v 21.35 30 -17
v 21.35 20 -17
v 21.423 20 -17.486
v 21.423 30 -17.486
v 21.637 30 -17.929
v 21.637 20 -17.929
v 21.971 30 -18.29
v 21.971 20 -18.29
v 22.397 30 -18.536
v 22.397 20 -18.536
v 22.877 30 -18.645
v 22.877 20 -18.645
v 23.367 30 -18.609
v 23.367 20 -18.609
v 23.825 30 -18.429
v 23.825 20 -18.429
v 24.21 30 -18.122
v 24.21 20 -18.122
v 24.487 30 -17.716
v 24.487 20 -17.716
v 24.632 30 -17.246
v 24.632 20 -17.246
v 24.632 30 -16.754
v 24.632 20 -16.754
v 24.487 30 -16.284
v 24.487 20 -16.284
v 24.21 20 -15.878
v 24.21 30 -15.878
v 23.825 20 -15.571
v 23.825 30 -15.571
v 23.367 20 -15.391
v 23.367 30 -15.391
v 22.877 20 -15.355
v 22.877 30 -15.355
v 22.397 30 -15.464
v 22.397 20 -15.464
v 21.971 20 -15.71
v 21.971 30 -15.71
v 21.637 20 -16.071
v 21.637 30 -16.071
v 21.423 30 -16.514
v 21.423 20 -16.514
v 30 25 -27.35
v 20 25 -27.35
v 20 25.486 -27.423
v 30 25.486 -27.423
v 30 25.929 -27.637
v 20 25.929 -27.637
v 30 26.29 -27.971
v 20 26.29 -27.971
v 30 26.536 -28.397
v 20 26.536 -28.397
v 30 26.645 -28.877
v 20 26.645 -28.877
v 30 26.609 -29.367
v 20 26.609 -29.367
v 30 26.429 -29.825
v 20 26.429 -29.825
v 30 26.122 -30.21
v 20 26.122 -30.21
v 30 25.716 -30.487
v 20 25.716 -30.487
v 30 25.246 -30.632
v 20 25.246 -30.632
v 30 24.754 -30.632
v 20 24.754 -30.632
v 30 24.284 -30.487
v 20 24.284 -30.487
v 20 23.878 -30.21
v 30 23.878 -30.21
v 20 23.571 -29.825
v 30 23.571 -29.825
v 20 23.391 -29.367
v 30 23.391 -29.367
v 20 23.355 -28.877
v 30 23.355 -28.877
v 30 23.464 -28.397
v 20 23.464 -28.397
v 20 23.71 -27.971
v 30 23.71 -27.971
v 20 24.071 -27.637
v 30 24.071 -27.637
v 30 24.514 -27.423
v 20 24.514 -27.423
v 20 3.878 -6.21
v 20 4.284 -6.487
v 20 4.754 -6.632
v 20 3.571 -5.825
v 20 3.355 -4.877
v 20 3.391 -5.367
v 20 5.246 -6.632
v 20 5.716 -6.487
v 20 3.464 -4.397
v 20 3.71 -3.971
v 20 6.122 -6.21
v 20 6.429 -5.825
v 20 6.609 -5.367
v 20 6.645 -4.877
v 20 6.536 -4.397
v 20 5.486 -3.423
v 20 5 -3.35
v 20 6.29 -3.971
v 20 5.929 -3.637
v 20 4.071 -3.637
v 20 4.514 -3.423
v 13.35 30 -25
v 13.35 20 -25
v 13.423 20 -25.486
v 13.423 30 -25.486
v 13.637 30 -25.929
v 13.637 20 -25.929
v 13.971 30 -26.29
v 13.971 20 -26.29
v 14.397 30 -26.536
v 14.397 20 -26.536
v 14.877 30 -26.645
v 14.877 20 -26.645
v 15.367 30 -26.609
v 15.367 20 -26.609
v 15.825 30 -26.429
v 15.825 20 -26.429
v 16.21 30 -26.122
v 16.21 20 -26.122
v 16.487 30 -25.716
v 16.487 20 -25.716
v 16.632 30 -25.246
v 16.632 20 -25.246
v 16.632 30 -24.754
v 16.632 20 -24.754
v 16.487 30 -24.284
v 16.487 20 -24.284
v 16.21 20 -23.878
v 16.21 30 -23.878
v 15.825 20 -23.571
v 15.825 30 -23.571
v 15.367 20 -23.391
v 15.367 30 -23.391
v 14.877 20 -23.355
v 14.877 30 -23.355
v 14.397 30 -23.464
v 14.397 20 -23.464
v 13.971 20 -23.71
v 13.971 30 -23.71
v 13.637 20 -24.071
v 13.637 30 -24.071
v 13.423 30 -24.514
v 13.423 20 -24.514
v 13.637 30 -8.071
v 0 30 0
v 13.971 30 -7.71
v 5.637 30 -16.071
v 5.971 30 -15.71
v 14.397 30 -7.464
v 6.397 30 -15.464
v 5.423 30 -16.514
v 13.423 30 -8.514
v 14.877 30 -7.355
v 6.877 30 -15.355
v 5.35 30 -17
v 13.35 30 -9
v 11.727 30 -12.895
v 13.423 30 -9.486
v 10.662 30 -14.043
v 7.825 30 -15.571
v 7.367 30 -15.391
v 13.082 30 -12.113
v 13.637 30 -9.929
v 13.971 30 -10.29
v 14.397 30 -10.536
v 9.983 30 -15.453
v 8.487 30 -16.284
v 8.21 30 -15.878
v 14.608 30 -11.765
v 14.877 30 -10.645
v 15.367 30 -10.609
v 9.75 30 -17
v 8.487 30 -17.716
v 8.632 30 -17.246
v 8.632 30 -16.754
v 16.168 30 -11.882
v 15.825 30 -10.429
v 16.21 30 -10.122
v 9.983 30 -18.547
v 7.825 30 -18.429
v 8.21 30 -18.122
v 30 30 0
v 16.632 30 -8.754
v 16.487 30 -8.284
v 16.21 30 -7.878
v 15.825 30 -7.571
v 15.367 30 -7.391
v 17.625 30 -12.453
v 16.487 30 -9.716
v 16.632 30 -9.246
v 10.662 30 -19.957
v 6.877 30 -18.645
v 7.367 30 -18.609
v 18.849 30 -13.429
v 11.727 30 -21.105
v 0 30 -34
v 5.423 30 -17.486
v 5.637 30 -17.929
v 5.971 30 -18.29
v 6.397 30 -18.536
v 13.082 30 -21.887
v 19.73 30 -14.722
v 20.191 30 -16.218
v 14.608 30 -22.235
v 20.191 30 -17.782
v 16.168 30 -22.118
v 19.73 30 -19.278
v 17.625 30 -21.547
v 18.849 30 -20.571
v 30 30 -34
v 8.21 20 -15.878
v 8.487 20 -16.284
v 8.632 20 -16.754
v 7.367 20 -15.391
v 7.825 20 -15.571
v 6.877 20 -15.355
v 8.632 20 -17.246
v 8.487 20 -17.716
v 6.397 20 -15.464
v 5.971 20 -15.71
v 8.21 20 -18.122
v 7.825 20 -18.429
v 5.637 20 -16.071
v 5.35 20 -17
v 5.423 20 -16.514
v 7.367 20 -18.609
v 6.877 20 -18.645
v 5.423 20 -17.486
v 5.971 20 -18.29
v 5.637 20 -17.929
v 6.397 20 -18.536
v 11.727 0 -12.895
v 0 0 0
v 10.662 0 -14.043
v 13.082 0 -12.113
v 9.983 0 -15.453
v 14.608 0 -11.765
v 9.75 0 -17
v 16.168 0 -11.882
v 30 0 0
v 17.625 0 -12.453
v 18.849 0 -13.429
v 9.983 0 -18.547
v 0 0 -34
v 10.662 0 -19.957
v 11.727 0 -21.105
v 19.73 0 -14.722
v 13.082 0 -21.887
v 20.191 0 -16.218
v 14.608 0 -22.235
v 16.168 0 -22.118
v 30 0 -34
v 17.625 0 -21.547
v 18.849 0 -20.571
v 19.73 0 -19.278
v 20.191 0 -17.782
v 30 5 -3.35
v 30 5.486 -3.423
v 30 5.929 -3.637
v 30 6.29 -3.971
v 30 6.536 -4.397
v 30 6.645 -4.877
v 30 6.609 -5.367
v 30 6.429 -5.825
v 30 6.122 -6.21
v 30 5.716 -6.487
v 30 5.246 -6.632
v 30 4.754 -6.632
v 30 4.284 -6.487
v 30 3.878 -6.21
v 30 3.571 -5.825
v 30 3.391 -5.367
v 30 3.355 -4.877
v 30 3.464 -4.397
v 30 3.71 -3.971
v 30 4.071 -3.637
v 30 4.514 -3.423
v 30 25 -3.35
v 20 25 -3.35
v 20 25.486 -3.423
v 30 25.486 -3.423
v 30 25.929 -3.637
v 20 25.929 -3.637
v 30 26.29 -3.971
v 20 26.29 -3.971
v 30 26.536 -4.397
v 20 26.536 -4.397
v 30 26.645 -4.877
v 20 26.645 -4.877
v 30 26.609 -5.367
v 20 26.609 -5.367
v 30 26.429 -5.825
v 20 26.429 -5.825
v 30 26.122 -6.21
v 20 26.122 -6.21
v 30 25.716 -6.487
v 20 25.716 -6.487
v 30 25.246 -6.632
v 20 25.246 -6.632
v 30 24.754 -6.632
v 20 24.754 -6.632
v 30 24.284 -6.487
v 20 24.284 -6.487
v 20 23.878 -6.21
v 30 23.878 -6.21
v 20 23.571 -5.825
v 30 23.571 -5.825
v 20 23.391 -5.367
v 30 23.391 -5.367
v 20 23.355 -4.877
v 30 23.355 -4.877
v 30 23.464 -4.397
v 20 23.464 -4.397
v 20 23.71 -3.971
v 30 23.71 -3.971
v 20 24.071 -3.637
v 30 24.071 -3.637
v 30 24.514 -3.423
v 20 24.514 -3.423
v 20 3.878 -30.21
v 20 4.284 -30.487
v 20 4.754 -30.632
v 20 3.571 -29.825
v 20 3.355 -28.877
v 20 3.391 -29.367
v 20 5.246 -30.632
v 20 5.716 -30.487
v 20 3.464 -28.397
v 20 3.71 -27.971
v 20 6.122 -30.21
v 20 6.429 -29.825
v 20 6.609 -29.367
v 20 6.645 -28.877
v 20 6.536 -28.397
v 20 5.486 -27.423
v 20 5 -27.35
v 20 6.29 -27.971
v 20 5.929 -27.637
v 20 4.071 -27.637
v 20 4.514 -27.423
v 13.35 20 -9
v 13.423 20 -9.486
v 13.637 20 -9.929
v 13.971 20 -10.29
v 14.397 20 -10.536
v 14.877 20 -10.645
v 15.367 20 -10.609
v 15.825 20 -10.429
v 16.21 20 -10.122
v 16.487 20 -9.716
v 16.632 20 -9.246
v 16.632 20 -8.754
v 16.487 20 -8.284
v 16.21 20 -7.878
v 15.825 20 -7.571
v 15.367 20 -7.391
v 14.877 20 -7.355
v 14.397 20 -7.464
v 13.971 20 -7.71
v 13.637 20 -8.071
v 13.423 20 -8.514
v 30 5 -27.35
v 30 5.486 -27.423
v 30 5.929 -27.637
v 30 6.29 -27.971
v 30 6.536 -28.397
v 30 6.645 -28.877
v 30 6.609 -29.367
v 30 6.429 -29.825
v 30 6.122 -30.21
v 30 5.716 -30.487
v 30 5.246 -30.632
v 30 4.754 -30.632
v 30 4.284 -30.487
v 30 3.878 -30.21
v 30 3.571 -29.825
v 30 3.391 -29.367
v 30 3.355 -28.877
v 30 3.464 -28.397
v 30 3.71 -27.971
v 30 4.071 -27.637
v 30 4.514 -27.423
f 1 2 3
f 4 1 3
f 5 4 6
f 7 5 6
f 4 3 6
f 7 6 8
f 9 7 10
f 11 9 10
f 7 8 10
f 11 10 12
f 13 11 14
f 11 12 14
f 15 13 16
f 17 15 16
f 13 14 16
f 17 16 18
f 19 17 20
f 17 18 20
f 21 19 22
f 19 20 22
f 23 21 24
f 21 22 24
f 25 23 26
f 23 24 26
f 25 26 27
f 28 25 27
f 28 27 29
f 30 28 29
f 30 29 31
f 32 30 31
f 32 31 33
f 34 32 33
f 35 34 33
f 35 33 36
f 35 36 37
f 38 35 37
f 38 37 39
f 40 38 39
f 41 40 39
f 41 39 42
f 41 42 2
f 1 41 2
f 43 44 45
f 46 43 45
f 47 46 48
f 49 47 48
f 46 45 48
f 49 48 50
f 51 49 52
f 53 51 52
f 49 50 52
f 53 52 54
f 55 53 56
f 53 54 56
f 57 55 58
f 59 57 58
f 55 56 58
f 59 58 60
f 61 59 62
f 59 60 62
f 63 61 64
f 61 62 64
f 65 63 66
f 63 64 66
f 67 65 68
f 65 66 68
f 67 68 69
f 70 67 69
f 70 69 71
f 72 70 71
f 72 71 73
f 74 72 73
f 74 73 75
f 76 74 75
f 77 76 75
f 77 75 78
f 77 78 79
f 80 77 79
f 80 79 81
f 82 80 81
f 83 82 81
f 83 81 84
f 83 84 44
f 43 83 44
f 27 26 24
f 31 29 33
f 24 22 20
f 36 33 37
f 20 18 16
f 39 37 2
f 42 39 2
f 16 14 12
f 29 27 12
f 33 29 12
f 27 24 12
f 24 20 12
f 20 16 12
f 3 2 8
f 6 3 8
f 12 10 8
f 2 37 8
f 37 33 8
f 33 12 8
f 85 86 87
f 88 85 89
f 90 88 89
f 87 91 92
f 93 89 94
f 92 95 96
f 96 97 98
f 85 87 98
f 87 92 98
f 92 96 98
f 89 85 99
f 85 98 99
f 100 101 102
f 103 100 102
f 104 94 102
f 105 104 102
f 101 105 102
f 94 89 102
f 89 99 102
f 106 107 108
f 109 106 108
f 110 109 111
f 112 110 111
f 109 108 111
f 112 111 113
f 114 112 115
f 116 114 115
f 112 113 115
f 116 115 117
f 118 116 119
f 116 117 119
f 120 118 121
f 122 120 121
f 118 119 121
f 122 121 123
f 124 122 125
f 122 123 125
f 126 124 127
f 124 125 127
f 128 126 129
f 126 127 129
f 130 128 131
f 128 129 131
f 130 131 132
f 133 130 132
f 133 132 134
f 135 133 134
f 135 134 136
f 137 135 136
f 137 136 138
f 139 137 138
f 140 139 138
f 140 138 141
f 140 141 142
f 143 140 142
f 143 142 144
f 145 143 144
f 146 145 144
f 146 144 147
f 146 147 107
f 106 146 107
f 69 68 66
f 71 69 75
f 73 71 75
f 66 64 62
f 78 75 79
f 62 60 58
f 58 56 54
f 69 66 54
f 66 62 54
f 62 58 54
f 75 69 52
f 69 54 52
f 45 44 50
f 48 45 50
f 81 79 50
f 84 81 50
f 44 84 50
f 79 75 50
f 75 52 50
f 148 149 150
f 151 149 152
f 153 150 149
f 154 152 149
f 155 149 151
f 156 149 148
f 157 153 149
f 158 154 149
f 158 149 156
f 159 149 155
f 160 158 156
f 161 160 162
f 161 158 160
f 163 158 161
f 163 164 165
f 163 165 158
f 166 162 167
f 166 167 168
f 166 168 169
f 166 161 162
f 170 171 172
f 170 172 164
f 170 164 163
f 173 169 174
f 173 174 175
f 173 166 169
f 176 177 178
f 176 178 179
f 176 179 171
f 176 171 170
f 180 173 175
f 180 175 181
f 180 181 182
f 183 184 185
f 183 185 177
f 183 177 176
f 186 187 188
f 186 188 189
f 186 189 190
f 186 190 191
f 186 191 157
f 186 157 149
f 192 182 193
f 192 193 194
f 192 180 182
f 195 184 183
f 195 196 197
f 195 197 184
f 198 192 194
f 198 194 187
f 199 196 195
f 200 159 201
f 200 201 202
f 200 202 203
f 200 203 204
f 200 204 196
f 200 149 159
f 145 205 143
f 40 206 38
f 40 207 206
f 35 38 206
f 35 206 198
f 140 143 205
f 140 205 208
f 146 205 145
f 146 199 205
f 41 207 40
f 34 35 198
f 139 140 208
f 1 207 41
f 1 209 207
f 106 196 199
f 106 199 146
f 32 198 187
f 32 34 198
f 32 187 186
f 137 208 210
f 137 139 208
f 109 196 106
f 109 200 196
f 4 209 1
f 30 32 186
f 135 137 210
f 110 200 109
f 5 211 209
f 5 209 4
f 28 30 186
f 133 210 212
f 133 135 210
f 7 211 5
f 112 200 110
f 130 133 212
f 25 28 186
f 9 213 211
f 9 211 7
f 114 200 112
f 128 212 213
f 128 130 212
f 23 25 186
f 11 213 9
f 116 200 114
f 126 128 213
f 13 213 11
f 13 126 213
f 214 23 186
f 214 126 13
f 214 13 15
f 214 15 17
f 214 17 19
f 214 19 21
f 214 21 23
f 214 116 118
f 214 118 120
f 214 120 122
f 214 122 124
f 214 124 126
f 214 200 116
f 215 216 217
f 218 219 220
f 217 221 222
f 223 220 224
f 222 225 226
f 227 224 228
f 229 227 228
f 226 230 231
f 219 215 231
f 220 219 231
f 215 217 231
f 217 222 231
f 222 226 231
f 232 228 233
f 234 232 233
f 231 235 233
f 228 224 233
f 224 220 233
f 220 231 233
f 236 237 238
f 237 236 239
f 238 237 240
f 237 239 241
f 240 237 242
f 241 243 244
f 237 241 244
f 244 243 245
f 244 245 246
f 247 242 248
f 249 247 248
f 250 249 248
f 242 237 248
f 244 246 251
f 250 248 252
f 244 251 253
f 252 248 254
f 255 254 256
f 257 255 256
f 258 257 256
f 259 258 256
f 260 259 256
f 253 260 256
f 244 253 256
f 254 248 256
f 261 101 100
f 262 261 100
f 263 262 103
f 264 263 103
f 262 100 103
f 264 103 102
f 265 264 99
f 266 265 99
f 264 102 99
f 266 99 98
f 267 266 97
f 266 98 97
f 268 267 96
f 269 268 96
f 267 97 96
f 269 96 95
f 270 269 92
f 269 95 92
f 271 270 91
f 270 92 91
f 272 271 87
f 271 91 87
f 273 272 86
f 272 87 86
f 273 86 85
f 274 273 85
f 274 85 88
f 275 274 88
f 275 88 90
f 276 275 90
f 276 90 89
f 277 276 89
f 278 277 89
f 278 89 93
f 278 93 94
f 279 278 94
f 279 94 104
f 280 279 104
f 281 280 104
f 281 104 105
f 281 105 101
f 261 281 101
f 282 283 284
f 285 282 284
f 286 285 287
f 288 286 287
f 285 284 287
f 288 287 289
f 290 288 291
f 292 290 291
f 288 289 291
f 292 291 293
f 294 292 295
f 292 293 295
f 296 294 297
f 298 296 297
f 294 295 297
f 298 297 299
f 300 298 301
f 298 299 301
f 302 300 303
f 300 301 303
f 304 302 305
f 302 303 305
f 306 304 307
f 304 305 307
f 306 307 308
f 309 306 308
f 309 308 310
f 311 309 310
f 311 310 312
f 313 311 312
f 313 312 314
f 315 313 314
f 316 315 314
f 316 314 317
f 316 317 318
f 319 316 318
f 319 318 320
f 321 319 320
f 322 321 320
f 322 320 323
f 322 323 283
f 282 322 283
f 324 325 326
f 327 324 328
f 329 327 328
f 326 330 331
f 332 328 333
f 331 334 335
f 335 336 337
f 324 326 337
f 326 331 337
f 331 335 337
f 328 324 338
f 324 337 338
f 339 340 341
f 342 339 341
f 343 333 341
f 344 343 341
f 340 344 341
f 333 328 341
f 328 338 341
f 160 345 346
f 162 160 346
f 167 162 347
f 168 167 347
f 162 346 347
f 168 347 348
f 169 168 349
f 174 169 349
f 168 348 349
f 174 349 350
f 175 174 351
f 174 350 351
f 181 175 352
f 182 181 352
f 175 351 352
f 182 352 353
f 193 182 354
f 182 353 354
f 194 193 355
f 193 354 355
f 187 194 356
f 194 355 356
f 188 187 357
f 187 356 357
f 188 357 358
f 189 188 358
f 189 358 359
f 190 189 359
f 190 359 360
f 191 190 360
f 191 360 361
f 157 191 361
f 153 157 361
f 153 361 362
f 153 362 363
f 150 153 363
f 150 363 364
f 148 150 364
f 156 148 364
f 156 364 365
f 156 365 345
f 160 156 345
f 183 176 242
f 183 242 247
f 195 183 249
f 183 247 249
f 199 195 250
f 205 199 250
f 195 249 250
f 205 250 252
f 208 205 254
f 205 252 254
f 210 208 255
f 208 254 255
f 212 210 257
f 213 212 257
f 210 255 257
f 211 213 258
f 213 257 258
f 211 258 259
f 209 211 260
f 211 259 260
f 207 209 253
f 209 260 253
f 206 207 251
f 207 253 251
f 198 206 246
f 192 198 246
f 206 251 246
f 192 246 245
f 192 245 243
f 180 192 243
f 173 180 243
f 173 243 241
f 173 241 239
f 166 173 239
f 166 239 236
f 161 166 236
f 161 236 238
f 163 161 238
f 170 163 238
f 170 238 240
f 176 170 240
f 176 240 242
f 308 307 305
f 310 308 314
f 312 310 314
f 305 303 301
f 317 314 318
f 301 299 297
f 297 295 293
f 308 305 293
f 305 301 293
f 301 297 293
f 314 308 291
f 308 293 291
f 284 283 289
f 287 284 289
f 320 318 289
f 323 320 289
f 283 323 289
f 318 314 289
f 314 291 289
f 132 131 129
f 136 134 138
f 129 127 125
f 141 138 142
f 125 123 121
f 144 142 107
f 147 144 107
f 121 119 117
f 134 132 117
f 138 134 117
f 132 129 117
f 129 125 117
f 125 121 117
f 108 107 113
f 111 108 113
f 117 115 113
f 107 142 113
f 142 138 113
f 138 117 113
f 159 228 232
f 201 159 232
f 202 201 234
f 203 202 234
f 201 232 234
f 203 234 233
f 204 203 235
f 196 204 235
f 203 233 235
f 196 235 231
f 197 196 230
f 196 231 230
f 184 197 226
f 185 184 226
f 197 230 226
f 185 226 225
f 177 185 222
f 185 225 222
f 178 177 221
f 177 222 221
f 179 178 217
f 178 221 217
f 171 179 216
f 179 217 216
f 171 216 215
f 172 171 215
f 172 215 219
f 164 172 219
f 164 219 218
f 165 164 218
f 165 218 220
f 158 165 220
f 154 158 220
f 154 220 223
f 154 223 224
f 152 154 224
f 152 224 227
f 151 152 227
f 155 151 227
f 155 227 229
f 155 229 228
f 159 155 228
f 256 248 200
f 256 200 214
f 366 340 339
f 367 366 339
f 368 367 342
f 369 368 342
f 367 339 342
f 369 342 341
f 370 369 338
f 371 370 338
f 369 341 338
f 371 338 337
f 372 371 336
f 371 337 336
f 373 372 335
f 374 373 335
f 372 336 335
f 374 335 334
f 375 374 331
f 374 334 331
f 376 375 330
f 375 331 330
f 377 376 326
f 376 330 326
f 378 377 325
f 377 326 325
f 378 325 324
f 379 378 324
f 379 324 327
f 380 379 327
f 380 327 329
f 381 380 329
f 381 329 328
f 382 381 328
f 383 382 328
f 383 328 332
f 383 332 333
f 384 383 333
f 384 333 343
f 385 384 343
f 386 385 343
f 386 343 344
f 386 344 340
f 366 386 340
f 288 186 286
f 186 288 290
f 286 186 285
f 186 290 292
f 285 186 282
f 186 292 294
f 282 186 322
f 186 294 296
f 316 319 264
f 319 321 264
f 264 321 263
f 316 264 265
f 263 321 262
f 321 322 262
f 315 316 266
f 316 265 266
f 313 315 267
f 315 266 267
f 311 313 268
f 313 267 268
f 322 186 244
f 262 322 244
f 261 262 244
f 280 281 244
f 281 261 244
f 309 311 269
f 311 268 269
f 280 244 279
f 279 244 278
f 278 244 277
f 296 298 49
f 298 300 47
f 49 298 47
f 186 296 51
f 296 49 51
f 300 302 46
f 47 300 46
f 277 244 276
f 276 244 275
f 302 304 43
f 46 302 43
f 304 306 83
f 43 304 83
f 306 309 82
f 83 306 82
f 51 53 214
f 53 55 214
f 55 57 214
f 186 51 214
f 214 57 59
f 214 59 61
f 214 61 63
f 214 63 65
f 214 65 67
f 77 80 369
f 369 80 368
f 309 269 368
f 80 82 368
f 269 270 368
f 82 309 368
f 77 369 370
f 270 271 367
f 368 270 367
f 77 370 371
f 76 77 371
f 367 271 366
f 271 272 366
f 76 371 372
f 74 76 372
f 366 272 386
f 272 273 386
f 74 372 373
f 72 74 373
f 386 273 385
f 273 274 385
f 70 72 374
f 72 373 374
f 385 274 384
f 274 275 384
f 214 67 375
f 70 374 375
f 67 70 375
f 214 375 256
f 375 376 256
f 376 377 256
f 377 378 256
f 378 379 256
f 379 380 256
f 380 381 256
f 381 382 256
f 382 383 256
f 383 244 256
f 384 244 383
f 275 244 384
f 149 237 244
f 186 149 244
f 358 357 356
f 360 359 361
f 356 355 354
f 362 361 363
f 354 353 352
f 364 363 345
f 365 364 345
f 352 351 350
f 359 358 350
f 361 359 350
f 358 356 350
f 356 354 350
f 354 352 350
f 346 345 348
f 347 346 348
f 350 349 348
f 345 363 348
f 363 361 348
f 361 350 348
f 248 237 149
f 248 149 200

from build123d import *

# Parameters (mm, degrees)
SKETCH_1_W          = 30
SKETCH_1_H          = 34
EXTRUDE_1_DEPTH     = 30
HOLE_WIZARD_1_D     = 3.3
HOLE_WIZARD_1_DEPTH = 10
HOLE_WIZARD_2_D     = 3.3
HOLE_WIZARD_2_DEPTH = 10
HOLE_WIZARD_3_D     = 10.5


with BuildPart() as part:
    # 草图1 → 凸台-拉伸1 (new body)
    with BuildSketch(Plane(origin=(0, 0, 0), x_dir=(1, 0, 0), z_dir=(0, 1, 0))):
        with Locations((15, 17)):
            Rectangle(SKETCH_1_W, SKETCH_1_H)
    extrude(amount=EXTRUDE_1_DEPTH)

    # 孔1
    with Locations(Plane(origin=(30, 0, 0), x_dir=(0, 0, -1), z_dir=(1, 0, 0))):
        with Locations((5, 25), (29, 25), (5, 5), (29, 5)):
            Hole(HOLE_WIZARD_1_D / 2, depth=HOLE_WIZARD_1_DEPTH)

    # 孔2
    with Locations(Plane(origin=(0, 30, 0), x_dir=(1, 0, 0), z_dir=(0, 1, 0))):
        with Locations((7, 17), (15, 25), (23, 17), (15, 9)):
            Hole(HOLE_WIZARD_2_D / 2, depth=HOLE_WIZARD_2_DEPTH)

    # 孔3 (through all)
    with Locations(Plane(origin=(0, 30, 0), x_dir=(1, 0, 0), z_dir=(0, 1, 0))):
        with Locations((15, 17)):
            Hole(HOLE_WIZARD_3_D / 2)


solid = part.part
